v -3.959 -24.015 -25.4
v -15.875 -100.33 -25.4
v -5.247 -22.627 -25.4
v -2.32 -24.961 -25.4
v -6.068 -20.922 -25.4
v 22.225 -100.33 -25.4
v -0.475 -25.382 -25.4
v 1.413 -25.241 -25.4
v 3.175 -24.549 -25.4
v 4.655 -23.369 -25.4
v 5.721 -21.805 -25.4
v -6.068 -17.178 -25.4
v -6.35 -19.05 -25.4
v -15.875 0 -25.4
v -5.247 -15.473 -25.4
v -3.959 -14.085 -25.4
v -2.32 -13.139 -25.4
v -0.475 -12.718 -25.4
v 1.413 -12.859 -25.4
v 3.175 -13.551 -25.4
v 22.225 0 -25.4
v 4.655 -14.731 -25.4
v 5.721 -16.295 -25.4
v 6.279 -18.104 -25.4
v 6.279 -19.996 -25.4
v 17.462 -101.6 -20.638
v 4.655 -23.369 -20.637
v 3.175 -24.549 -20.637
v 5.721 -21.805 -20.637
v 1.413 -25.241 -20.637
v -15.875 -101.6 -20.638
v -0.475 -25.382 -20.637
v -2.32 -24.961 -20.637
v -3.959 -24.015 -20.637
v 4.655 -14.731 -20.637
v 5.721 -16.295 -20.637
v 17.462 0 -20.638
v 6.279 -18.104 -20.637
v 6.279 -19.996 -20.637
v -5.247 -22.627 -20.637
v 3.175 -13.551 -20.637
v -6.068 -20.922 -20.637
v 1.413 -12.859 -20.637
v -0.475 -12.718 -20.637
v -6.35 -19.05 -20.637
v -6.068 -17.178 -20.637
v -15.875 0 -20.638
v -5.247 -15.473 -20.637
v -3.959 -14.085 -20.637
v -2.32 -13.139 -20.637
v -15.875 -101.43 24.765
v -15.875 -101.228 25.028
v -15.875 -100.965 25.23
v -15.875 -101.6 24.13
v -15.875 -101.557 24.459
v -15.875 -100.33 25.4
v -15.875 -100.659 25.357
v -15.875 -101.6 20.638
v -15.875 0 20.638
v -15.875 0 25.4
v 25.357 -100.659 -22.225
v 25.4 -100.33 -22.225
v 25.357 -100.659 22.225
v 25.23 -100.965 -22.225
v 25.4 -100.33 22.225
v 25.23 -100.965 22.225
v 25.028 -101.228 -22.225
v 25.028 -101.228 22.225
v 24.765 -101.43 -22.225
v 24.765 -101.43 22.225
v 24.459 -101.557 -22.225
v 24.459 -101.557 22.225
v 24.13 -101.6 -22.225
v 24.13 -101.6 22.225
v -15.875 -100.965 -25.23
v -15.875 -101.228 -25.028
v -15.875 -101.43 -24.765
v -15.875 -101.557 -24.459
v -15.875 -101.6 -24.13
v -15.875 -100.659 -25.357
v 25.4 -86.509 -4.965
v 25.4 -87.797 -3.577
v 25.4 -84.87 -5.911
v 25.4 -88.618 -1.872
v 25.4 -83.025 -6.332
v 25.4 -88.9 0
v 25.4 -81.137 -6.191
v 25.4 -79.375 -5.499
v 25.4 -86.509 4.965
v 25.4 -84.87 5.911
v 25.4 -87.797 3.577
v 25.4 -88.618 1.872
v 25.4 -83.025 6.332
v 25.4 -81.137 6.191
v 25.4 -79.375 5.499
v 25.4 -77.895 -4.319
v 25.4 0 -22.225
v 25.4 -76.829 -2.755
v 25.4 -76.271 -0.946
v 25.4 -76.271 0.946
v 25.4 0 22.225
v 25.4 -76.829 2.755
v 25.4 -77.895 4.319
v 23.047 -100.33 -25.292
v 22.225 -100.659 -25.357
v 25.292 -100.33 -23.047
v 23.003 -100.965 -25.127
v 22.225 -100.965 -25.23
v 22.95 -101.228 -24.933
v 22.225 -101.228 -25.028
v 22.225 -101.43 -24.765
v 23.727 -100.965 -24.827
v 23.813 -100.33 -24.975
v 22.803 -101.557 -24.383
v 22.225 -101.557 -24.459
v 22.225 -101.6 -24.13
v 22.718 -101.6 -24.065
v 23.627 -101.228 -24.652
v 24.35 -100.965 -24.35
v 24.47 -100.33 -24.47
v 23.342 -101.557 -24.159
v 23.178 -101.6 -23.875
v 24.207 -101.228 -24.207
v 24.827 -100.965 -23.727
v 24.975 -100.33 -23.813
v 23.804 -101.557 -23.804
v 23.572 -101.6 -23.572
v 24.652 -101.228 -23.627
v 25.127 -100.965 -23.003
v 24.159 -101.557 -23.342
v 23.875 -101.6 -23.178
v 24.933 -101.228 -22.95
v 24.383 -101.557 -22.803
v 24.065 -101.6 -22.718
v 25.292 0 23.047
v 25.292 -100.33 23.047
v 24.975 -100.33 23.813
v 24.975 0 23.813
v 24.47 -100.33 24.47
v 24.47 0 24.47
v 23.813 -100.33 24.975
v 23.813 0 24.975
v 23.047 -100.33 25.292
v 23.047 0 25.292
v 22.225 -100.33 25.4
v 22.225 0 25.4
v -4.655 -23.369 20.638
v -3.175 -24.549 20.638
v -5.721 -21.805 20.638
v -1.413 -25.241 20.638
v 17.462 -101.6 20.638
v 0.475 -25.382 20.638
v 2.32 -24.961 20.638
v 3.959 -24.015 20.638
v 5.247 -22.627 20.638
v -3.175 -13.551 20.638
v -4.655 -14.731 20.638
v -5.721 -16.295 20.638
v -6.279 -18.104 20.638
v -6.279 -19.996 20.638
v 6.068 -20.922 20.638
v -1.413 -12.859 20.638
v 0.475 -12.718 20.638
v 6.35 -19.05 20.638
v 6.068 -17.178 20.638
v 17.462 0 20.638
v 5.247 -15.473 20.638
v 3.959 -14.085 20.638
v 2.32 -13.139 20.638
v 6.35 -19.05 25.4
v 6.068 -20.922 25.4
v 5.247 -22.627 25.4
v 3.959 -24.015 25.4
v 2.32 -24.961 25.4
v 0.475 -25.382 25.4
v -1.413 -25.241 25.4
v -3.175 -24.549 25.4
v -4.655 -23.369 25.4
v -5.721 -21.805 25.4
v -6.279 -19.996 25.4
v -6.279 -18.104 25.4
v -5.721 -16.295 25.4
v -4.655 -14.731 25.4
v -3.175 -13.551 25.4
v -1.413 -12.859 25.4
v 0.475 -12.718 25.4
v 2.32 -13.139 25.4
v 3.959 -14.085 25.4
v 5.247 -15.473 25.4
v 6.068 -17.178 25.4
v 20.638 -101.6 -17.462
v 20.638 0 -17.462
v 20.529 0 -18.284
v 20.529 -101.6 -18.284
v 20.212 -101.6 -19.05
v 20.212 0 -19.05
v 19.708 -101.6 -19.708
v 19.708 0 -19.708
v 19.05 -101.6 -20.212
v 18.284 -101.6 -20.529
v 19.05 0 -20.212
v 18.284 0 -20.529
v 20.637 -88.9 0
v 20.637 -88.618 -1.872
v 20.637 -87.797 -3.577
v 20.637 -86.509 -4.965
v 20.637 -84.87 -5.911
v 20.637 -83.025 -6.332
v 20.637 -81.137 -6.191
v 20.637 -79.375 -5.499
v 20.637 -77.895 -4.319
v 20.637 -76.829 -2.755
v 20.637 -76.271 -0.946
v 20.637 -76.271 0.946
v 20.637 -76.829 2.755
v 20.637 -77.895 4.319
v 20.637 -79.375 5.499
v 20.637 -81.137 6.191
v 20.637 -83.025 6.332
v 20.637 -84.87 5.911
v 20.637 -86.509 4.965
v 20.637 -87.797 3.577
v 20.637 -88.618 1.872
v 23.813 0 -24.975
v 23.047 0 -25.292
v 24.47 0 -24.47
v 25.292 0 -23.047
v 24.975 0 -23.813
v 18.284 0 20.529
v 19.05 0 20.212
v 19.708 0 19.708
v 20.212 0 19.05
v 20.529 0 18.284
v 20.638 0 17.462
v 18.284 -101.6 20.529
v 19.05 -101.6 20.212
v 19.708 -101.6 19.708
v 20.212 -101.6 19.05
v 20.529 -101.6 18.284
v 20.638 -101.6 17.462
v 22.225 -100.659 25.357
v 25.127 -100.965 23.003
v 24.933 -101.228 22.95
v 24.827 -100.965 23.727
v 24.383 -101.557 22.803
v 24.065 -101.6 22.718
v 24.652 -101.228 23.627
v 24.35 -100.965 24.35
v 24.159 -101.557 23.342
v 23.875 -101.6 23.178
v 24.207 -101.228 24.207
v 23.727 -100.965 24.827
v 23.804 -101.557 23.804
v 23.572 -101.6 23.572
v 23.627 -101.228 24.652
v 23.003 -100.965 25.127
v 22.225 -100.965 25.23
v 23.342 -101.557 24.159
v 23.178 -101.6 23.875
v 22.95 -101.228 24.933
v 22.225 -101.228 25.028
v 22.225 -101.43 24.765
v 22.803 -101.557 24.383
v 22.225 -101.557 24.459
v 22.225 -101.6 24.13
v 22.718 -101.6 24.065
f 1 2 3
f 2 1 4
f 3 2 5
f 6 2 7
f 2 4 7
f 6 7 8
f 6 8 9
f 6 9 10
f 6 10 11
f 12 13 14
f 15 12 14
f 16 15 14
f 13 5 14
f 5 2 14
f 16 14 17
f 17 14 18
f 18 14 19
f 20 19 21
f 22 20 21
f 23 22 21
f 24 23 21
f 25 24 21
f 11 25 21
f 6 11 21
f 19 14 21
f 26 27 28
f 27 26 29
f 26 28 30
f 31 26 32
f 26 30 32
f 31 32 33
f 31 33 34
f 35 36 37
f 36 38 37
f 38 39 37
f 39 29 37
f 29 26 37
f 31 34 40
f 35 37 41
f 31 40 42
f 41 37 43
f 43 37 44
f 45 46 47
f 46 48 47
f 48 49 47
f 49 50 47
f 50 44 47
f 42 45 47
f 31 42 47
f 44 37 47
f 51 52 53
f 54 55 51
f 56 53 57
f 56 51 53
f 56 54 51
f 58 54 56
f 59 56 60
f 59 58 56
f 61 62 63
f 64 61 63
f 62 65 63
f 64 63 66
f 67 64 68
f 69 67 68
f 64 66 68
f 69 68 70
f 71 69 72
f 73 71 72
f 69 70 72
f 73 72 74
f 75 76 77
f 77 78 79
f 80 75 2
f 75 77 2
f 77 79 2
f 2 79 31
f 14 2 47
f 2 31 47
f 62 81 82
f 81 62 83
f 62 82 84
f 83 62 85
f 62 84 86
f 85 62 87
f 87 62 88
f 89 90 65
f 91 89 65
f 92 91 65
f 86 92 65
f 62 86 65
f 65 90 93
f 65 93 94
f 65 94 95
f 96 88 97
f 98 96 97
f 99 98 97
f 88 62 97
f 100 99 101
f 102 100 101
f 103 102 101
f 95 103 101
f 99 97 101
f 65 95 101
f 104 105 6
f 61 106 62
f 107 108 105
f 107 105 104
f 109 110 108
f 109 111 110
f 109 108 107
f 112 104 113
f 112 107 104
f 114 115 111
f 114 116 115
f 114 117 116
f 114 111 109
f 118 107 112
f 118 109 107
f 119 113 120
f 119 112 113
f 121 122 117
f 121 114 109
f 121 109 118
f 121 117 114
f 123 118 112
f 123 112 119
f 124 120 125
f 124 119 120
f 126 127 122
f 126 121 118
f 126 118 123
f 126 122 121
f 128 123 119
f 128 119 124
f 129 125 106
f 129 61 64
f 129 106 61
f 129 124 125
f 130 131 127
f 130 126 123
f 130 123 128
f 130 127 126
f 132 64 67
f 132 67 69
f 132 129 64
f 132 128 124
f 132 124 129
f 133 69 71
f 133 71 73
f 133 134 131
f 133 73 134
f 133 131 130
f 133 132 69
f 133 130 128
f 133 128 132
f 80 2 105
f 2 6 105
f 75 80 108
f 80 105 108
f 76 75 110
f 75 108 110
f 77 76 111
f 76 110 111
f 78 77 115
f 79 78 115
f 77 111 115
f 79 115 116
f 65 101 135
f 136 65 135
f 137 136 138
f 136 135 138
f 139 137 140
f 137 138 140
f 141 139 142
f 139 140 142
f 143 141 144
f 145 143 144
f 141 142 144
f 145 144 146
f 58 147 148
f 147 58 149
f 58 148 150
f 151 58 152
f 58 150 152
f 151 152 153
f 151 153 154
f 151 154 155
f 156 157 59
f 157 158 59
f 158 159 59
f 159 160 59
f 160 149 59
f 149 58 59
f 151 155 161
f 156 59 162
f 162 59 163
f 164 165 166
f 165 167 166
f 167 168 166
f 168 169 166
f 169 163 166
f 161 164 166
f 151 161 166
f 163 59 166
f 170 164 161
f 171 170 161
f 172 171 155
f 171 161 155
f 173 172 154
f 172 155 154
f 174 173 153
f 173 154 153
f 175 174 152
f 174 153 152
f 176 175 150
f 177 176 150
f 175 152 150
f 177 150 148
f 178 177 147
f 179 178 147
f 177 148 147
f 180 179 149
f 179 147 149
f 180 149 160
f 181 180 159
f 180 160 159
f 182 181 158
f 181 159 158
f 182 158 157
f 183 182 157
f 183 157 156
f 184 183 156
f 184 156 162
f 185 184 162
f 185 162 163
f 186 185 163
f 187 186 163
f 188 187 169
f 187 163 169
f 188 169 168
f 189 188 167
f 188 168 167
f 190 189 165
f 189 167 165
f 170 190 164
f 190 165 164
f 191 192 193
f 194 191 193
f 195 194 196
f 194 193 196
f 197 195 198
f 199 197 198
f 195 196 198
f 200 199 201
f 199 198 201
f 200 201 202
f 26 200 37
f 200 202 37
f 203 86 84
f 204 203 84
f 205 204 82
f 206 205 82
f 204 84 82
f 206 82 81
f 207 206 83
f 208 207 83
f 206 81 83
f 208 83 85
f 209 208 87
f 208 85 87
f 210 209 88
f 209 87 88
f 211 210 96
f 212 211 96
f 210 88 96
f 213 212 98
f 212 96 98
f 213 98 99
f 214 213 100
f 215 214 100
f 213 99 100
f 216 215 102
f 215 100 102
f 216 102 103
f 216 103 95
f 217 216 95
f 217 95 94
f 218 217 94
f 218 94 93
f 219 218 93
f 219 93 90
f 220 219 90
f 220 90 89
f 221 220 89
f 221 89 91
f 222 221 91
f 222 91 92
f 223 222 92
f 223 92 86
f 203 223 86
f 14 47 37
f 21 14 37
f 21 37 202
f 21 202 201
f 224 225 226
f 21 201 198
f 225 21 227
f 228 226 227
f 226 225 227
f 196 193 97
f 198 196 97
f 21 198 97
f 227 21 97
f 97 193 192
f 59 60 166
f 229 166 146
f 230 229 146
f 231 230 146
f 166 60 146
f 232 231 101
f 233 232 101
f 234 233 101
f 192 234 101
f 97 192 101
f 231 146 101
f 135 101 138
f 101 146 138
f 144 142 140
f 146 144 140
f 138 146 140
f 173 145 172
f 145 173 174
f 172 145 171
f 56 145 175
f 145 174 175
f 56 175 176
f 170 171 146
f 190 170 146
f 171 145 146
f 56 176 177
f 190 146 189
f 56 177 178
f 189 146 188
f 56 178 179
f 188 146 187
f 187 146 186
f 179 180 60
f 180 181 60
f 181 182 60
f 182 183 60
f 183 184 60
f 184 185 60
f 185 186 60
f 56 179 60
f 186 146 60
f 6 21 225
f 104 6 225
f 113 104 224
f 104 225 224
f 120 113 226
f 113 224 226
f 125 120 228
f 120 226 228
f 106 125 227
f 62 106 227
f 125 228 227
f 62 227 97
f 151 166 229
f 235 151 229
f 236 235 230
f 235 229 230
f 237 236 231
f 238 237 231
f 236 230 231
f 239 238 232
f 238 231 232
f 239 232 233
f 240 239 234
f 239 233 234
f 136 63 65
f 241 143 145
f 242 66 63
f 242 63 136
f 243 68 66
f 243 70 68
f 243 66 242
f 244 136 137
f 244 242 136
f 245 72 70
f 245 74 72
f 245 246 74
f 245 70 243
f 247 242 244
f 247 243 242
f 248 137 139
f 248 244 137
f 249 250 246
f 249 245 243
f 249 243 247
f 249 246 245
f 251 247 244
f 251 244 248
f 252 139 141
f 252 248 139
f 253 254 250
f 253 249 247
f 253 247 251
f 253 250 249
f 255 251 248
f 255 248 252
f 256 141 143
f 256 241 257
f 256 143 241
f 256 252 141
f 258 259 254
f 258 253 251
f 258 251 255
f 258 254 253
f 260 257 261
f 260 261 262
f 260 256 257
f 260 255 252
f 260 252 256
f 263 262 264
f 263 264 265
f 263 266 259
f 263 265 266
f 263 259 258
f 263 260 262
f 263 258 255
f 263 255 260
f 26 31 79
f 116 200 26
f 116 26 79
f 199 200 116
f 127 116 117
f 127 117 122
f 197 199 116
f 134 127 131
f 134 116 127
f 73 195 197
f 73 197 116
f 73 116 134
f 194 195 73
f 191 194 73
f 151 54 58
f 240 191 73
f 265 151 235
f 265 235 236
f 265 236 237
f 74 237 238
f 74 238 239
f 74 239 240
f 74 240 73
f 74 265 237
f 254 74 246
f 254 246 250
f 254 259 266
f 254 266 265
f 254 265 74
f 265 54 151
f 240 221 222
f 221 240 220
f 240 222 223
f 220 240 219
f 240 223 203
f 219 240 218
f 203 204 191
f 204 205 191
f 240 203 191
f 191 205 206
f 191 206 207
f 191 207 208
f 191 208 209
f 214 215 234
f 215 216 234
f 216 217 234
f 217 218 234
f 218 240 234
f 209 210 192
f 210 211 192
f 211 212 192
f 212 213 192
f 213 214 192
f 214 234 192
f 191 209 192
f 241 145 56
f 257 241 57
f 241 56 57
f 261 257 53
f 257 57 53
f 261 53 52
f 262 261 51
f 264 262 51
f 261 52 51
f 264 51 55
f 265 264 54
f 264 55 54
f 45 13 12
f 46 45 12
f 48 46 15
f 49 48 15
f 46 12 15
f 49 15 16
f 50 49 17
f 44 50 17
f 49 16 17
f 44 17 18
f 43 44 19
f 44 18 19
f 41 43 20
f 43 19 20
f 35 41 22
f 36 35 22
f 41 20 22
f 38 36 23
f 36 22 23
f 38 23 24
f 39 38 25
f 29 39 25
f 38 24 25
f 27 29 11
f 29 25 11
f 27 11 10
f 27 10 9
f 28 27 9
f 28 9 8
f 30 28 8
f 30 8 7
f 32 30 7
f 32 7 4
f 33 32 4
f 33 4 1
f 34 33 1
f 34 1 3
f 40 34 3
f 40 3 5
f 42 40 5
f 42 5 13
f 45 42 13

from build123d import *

# Parameters (mm, degrees)
F7_DEPTH       = 101.6
F2_DEPTH       = 25.4
F2_DEPTH_BACK  = 25.4
F4_D           = 12.7
F4_ON_F1_D     = 12.7
F4_ON_F1_DEPTH = 25.401
F5_D           = 12.7
F6_R           = 1.27


with BuildPart() as f7:
    # F0 (on Front) → F7 (new body)
    with BuildSketch(Plane.XZ):
        with BuildLine():
            Line((-22.225, -25.4), (22.225, -25.4))
            ThreePointArc((22.225, -25.4), (24.4700640303, -24.4700640303), (25.4, -22.225))
            Line((25.4, -22.225), (25.4, 22.225))
            ThreePointArc((25.4, 22.225), (24.4700640303, 24.4700640303), (22.225, 25.4))
            Line((22.225, 25.4), (-22.225, 25.4))
            ThreePointArc((-22.225, 25.4), (-24.4700640303, 24.4700640303), (-25.4, 22.225))
            Line((-25.4, 22.225), (-25.4, -22.225))
            ThreePointArc((-25.4, -22.225), (-24.4700640303, -24.4700640303), (-22.225, -25.4))
        make_face()
        with BuildLine():
            ThreePointArc((20.6375, -17.4625), (19.7075640303, -19.7075640303), (17.4625, -20.6375))
            Line((17.4625, -20.6375), (-17.4625, -20.6375))
            ThreePointArc((-17.4625, -20.6375), (-19.7075640303, -19.7075640303), (-20.6375, -17.4625))
            Line((-20.6375, -17.4625), (-20.6375, 17.4625))
            ThreePointArc((-20.6375, 17.4625), (-19.7075640303, 19.7075640303), (-17.4625, 20.6375))
            Line((-17.4625, 20.6375), (17.4625, 20.6375))
            ThreePointArc((17.4625, 20.6375), (19.7075640303, 19.7075640303), (20.6375, 17.4625))
            Line((20.6375, 17.4625), (20.6375, -17.4625))
        make_face(mode=Mode.SUBTRACT)
    extrude(amount=F7_DEPTH)

    # F1 (on Top) → F2 (cut, two sides)
    with BuildSketch(Plane.XY) as f2_sk:
        Polygon((-15.875, -63.5), (-15.875, 0), (-37.8918275237, 0), (-37.8918275237, -101.6), (-20.6375, -101.6), (-15.875, -101.6), align=None)
    extrude(amount=-F2_DEPTH, mode=Mode.SUBTRACT)
    extrude(f2_sk.sketch, amount=F2_DEPTH_BACK, mode=Mode.SUBTRACT)

    # F4 (through all)
    with Locations(Plane(origin=(0, 0, 0), x_dir=(0, 1, 0), z_dir=(-1, 0, 0))):
        with Locations((-82.55, 0)):
            Hole(F4_D / 2)

    # F4 on F1 (through all, one way)
    with BuildSketch(Plane(origin=(0, 0, 0), x_dir=(1, 0, 0), z_dir=(0, 0, -1))):
        with Locations((0, 19.05)):
            Circle(F4_ON_F1_D / 2)
    extrude(amount=-F4_ON_F1_DEPTH, mode=Mode.SUBTRACT)

    # F5 (through all)
    with Locations(Plane.XY):
        with Locations((0, -19.05)):
            Hole(F5_D / 2)

    # F6
    f6_edges = [f7.edges().sort_by_distance(p)[0] for p in [
        (25.4, -101.6, 0),
    ]]
    fillet(f6_edges, radius=F6_R)


solid = f7.part
